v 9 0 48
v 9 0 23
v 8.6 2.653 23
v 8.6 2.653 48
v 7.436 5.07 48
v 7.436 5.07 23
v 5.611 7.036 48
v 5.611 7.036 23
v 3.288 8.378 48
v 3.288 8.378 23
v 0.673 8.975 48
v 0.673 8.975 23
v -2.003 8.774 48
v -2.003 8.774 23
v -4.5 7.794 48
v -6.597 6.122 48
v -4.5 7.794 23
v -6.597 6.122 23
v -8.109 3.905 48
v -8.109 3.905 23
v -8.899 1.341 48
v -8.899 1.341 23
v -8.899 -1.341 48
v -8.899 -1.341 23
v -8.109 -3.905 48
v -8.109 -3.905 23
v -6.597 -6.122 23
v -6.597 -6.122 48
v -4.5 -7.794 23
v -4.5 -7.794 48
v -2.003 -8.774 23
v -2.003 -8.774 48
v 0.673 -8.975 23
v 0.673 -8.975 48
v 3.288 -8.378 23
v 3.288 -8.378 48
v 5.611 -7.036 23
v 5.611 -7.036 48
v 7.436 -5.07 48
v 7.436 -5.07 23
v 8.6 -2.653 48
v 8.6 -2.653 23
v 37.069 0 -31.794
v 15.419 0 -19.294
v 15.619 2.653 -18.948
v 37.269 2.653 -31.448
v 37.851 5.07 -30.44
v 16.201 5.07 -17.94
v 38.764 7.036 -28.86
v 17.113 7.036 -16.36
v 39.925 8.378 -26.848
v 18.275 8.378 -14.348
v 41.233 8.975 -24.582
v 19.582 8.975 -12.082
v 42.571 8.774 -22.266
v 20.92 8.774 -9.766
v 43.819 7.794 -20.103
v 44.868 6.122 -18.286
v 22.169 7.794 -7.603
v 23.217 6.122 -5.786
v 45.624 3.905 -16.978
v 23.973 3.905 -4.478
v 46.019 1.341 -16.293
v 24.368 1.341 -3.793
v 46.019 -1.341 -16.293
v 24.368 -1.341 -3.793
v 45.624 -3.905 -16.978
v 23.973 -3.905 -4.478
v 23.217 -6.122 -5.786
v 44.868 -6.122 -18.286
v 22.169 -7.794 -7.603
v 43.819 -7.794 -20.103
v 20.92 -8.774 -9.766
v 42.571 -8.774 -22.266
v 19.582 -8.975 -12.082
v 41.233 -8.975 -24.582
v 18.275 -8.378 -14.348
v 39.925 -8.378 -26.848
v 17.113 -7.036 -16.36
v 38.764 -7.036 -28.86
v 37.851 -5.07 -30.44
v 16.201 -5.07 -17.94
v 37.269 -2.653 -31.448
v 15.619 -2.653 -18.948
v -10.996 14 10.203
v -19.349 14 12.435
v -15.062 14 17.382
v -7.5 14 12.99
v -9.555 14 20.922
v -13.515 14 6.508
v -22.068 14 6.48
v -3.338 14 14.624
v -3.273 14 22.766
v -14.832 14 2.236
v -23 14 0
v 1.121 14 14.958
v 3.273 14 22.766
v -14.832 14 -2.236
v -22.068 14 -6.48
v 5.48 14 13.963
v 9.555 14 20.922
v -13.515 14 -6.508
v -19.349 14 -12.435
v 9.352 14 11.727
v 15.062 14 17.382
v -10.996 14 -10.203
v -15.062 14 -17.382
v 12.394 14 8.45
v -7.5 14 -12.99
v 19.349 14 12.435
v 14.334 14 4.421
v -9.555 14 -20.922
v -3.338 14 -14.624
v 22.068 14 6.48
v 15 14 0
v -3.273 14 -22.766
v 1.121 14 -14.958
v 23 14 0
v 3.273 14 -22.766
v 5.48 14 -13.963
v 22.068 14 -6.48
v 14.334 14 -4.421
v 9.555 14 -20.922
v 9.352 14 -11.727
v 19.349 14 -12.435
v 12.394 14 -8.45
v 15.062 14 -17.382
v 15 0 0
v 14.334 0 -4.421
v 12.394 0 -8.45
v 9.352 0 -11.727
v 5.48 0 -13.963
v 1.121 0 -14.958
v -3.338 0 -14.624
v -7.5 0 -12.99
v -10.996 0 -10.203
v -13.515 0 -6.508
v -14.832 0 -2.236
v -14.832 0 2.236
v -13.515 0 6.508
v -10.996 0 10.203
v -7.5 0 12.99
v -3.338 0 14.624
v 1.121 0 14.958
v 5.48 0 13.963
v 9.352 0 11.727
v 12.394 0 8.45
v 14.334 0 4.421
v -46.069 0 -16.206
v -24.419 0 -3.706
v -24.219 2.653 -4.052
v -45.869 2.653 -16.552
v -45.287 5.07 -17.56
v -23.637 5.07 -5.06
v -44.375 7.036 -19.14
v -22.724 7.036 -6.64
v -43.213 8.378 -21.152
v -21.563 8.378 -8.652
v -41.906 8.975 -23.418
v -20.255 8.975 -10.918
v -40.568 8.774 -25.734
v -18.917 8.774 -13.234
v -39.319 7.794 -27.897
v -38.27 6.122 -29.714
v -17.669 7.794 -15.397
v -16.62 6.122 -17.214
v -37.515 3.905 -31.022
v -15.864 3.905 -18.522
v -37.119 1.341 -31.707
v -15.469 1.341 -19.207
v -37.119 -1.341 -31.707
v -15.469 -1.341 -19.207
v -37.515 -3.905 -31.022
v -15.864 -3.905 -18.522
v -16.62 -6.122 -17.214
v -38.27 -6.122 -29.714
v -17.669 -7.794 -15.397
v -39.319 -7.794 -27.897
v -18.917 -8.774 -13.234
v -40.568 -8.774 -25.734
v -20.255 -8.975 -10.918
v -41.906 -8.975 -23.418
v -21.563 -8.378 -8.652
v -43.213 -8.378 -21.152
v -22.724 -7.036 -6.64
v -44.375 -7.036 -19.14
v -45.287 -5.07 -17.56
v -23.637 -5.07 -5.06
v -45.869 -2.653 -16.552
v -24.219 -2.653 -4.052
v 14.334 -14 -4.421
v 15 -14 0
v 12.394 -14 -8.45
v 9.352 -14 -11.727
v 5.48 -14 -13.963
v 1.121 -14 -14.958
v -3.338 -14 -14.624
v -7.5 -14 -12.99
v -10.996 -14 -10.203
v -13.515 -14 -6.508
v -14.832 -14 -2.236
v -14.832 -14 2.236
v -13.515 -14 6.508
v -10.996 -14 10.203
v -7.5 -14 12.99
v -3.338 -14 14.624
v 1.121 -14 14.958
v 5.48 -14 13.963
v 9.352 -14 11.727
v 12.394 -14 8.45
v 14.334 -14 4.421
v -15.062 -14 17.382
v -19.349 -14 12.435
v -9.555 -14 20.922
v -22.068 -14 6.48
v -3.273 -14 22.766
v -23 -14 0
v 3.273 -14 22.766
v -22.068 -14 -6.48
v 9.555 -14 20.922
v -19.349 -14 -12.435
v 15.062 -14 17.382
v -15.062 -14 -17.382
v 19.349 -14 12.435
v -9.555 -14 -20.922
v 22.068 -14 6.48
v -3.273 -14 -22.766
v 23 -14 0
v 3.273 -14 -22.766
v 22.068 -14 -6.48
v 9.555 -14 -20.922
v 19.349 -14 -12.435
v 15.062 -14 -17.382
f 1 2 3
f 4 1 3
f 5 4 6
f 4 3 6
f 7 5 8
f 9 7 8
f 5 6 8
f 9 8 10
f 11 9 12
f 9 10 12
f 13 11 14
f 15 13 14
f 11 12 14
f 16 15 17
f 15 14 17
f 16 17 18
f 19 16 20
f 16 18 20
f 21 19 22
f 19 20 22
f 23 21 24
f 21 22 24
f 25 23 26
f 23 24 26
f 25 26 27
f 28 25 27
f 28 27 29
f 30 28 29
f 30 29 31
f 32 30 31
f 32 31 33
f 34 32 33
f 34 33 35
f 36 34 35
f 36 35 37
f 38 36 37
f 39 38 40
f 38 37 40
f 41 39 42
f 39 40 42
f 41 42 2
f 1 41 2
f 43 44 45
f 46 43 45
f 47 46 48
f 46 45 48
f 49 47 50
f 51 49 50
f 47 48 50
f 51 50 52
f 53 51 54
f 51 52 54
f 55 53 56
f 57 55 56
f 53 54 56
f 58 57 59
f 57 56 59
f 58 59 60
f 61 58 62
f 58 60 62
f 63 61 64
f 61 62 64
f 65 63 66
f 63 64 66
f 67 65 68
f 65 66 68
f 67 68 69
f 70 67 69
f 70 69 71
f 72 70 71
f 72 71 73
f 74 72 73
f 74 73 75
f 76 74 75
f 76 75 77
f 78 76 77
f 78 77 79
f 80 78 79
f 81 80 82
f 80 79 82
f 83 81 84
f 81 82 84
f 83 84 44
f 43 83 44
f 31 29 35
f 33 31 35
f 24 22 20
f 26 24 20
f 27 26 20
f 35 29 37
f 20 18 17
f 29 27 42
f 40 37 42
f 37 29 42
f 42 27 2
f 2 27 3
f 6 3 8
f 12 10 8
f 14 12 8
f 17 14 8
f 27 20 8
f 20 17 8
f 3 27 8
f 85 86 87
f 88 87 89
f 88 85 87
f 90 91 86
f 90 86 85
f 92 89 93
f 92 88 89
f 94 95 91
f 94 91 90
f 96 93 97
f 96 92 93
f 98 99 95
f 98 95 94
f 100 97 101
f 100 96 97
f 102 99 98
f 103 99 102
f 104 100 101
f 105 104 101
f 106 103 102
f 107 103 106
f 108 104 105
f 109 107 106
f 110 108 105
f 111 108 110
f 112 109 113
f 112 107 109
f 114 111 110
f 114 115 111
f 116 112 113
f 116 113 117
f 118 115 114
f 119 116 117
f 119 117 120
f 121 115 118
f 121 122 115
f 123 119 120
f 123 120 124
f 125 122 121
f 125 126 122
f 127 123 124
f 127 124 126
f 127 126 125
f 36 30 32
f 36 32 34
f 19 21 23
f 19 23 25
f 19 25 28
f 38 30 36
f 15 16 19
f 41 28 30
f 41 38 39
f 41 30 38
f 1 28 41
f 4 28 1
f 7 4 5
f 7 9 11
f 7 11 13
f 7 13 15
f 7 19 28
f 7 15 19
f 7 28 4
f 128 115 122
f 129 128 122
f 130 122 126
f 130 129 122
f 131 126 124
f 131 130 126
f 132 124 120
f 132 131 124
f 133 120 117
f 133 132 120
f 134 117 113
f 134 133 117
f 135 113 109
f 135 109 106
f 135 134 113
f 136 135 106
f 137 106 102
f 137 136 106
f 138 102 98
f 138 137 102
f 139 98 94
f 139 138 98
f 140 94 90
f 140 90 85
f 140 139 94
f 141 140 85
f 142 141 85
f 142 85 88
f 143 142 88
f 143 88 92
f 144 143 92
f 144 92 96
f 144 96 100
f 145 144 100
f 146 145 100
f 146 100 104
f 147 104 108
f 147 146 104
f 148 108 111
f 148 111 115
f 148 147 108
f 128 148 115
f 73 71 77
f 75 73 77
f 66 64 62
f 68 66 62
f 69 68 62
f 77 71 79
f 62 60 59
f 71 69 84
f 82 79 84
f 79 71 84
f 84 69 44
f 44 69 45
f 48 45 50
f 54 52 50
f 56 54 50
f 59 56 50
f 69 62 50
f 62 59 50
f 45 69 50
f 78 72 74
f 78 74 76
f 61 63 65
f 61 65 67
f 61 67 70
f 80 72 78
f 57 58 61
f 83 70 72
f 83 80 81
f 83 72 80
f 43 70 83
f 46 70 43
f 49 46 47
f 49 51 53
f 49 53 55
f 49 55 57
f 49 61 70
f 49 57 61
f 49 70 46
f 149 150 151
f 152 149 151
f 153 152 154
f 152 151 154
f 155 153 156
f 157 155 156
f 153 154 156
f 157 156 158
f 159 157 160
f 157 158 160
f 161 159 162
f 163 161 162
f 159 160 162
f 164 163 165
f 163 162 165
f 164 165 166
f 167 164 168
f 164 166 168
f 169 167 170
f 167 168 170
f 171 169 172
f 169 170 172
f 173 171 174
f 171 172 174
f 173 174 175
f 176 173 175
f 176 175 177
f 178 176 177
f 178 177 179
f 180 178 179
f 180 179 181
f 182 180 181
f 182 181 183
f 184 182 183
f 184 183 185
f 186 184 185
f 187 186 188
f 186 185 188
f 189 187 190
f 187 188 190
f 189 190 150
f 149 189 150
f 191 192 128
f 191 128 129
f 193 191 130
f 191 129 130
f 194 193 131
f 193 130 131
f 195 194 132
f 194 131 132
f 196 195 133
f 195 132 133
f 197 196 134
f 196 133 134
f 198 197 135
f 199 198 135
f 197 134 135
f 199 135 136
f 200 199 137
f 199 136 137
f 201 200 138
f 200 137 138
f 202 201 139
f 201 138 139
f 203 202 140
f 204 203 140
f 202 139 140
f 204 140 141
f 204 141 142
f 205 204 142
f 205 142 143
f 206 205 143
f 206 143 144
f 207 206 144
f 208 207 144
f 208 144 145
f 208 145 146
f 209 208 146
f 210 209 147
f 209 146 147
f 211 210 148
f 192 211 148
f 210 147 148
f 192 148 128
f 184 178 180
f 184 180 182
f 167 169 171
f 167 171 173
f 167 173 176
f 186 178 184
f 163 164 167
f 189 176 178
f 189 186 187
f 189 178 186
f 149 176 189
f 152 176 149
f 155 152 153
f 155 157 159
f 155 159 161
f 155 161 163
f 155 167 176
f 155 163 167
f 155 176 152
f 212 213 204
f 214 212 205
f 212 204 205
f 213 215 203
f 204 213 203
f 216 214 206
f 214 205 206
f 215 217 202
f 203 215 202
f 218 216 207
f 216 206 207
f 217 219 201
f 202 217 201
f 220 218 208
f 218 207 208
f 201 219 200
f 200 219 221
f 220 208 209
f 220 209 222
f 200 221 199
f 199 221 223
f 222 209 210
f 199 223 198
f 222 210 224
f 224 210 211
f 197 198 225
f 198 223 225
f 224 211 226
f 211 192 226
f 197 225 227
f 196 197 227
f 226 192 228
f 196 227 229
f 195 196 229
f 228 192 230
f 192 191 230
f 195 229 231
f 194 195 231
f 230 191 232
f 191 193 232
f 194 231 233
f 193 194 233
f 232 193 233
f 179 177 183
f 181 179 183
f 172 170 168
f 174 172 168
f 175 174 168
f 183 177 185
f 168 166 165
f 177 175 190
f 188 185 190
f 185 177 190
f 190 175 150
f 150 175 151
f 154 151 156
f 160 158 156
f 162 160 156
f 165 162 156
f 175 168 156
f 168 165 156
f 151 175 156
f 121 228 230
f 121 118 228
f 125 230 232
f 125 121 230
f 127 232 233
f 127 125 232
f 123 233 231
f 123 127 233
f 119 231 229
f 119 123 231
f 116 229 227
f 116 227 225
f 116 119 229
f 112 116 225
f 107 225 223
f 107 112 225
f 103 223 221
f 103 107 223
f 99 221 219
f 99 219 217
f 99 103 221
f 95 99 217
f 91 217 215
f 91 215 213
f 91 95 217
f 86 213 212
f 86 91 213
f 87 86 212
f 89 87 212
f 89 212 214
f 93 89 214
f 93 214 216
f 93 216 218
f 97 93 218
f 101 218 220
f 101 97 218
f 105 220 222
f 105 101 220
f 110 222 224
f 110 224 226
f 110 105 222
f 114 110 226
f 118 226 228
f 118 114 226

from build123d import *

# Parameters (mm, degrees)
BOSS_EXTRU_1_DEPTH           = 14
BOSS_EXTRU_1_DEPTH_BACK      = 14
ESQUISSE1_R                  = 23
ESQUISSE1_R_2                = 15
ESQUISSE2_R                  = 9
BOSS_EXTRU_2_DEPTH           = 25
R_P_TITION_CIRCULAIRE6_COUNT = 3


with BuildPart() as part:
    # Esquisse1 → Boss.-Extru.1 (new, two sides: drawn at the far end of the back side and taken through both)
    with BuildSketch(Plane(origin=(0, 0, 0), x_dir=(1, 0, 0), z_dir=(0, 1, 0)).offset(-BOSS_EXTRU_1_DEPTH_BACK)):
        Circle(ESQUISSE1_R)
        Circle(ESQUISSE1_R_2, mode=Mode.SUBTRACT)
    extrude(amount=BOSS_EXTRU_1_DEPTH + BOSS_EXTRU_1_DEPTH_BACK)


with BuildPart() as body_2:
    # Esquisse2 → Boss.-Extru.2 (new body)
    with BuildSketch(Plane.XY.offset(23)):
        Circle(ESQUISSE2_R)
    extrude(amount=BOSS_EXTRU_2_DEPTH)


with BuildPart() as r_p_tition_circulaire6_1:
    # Répétition circulaire6: pattern copy
    add(body_2.part.rotate(Axis((0, -14, 0), (0, 1, 0)), 1 * 360 / R_P_TITION_CIRCULAIRE6_COUNT))


with BuildPart() as r_p_tition_circulaire6_2:
    # Répétition circulaire6: pattern copy
    add(body_2.part.rotate(Axis((0, -14, 0), (0, 1, 0)), 2 * 360 / R_P_TITION_CIRCULAIRE6_COUNT))


solid = Compound([part.part, body_2.part, r_p_tition_circulaire6_1.part, r_p_tition_circulaire6_2.part])
